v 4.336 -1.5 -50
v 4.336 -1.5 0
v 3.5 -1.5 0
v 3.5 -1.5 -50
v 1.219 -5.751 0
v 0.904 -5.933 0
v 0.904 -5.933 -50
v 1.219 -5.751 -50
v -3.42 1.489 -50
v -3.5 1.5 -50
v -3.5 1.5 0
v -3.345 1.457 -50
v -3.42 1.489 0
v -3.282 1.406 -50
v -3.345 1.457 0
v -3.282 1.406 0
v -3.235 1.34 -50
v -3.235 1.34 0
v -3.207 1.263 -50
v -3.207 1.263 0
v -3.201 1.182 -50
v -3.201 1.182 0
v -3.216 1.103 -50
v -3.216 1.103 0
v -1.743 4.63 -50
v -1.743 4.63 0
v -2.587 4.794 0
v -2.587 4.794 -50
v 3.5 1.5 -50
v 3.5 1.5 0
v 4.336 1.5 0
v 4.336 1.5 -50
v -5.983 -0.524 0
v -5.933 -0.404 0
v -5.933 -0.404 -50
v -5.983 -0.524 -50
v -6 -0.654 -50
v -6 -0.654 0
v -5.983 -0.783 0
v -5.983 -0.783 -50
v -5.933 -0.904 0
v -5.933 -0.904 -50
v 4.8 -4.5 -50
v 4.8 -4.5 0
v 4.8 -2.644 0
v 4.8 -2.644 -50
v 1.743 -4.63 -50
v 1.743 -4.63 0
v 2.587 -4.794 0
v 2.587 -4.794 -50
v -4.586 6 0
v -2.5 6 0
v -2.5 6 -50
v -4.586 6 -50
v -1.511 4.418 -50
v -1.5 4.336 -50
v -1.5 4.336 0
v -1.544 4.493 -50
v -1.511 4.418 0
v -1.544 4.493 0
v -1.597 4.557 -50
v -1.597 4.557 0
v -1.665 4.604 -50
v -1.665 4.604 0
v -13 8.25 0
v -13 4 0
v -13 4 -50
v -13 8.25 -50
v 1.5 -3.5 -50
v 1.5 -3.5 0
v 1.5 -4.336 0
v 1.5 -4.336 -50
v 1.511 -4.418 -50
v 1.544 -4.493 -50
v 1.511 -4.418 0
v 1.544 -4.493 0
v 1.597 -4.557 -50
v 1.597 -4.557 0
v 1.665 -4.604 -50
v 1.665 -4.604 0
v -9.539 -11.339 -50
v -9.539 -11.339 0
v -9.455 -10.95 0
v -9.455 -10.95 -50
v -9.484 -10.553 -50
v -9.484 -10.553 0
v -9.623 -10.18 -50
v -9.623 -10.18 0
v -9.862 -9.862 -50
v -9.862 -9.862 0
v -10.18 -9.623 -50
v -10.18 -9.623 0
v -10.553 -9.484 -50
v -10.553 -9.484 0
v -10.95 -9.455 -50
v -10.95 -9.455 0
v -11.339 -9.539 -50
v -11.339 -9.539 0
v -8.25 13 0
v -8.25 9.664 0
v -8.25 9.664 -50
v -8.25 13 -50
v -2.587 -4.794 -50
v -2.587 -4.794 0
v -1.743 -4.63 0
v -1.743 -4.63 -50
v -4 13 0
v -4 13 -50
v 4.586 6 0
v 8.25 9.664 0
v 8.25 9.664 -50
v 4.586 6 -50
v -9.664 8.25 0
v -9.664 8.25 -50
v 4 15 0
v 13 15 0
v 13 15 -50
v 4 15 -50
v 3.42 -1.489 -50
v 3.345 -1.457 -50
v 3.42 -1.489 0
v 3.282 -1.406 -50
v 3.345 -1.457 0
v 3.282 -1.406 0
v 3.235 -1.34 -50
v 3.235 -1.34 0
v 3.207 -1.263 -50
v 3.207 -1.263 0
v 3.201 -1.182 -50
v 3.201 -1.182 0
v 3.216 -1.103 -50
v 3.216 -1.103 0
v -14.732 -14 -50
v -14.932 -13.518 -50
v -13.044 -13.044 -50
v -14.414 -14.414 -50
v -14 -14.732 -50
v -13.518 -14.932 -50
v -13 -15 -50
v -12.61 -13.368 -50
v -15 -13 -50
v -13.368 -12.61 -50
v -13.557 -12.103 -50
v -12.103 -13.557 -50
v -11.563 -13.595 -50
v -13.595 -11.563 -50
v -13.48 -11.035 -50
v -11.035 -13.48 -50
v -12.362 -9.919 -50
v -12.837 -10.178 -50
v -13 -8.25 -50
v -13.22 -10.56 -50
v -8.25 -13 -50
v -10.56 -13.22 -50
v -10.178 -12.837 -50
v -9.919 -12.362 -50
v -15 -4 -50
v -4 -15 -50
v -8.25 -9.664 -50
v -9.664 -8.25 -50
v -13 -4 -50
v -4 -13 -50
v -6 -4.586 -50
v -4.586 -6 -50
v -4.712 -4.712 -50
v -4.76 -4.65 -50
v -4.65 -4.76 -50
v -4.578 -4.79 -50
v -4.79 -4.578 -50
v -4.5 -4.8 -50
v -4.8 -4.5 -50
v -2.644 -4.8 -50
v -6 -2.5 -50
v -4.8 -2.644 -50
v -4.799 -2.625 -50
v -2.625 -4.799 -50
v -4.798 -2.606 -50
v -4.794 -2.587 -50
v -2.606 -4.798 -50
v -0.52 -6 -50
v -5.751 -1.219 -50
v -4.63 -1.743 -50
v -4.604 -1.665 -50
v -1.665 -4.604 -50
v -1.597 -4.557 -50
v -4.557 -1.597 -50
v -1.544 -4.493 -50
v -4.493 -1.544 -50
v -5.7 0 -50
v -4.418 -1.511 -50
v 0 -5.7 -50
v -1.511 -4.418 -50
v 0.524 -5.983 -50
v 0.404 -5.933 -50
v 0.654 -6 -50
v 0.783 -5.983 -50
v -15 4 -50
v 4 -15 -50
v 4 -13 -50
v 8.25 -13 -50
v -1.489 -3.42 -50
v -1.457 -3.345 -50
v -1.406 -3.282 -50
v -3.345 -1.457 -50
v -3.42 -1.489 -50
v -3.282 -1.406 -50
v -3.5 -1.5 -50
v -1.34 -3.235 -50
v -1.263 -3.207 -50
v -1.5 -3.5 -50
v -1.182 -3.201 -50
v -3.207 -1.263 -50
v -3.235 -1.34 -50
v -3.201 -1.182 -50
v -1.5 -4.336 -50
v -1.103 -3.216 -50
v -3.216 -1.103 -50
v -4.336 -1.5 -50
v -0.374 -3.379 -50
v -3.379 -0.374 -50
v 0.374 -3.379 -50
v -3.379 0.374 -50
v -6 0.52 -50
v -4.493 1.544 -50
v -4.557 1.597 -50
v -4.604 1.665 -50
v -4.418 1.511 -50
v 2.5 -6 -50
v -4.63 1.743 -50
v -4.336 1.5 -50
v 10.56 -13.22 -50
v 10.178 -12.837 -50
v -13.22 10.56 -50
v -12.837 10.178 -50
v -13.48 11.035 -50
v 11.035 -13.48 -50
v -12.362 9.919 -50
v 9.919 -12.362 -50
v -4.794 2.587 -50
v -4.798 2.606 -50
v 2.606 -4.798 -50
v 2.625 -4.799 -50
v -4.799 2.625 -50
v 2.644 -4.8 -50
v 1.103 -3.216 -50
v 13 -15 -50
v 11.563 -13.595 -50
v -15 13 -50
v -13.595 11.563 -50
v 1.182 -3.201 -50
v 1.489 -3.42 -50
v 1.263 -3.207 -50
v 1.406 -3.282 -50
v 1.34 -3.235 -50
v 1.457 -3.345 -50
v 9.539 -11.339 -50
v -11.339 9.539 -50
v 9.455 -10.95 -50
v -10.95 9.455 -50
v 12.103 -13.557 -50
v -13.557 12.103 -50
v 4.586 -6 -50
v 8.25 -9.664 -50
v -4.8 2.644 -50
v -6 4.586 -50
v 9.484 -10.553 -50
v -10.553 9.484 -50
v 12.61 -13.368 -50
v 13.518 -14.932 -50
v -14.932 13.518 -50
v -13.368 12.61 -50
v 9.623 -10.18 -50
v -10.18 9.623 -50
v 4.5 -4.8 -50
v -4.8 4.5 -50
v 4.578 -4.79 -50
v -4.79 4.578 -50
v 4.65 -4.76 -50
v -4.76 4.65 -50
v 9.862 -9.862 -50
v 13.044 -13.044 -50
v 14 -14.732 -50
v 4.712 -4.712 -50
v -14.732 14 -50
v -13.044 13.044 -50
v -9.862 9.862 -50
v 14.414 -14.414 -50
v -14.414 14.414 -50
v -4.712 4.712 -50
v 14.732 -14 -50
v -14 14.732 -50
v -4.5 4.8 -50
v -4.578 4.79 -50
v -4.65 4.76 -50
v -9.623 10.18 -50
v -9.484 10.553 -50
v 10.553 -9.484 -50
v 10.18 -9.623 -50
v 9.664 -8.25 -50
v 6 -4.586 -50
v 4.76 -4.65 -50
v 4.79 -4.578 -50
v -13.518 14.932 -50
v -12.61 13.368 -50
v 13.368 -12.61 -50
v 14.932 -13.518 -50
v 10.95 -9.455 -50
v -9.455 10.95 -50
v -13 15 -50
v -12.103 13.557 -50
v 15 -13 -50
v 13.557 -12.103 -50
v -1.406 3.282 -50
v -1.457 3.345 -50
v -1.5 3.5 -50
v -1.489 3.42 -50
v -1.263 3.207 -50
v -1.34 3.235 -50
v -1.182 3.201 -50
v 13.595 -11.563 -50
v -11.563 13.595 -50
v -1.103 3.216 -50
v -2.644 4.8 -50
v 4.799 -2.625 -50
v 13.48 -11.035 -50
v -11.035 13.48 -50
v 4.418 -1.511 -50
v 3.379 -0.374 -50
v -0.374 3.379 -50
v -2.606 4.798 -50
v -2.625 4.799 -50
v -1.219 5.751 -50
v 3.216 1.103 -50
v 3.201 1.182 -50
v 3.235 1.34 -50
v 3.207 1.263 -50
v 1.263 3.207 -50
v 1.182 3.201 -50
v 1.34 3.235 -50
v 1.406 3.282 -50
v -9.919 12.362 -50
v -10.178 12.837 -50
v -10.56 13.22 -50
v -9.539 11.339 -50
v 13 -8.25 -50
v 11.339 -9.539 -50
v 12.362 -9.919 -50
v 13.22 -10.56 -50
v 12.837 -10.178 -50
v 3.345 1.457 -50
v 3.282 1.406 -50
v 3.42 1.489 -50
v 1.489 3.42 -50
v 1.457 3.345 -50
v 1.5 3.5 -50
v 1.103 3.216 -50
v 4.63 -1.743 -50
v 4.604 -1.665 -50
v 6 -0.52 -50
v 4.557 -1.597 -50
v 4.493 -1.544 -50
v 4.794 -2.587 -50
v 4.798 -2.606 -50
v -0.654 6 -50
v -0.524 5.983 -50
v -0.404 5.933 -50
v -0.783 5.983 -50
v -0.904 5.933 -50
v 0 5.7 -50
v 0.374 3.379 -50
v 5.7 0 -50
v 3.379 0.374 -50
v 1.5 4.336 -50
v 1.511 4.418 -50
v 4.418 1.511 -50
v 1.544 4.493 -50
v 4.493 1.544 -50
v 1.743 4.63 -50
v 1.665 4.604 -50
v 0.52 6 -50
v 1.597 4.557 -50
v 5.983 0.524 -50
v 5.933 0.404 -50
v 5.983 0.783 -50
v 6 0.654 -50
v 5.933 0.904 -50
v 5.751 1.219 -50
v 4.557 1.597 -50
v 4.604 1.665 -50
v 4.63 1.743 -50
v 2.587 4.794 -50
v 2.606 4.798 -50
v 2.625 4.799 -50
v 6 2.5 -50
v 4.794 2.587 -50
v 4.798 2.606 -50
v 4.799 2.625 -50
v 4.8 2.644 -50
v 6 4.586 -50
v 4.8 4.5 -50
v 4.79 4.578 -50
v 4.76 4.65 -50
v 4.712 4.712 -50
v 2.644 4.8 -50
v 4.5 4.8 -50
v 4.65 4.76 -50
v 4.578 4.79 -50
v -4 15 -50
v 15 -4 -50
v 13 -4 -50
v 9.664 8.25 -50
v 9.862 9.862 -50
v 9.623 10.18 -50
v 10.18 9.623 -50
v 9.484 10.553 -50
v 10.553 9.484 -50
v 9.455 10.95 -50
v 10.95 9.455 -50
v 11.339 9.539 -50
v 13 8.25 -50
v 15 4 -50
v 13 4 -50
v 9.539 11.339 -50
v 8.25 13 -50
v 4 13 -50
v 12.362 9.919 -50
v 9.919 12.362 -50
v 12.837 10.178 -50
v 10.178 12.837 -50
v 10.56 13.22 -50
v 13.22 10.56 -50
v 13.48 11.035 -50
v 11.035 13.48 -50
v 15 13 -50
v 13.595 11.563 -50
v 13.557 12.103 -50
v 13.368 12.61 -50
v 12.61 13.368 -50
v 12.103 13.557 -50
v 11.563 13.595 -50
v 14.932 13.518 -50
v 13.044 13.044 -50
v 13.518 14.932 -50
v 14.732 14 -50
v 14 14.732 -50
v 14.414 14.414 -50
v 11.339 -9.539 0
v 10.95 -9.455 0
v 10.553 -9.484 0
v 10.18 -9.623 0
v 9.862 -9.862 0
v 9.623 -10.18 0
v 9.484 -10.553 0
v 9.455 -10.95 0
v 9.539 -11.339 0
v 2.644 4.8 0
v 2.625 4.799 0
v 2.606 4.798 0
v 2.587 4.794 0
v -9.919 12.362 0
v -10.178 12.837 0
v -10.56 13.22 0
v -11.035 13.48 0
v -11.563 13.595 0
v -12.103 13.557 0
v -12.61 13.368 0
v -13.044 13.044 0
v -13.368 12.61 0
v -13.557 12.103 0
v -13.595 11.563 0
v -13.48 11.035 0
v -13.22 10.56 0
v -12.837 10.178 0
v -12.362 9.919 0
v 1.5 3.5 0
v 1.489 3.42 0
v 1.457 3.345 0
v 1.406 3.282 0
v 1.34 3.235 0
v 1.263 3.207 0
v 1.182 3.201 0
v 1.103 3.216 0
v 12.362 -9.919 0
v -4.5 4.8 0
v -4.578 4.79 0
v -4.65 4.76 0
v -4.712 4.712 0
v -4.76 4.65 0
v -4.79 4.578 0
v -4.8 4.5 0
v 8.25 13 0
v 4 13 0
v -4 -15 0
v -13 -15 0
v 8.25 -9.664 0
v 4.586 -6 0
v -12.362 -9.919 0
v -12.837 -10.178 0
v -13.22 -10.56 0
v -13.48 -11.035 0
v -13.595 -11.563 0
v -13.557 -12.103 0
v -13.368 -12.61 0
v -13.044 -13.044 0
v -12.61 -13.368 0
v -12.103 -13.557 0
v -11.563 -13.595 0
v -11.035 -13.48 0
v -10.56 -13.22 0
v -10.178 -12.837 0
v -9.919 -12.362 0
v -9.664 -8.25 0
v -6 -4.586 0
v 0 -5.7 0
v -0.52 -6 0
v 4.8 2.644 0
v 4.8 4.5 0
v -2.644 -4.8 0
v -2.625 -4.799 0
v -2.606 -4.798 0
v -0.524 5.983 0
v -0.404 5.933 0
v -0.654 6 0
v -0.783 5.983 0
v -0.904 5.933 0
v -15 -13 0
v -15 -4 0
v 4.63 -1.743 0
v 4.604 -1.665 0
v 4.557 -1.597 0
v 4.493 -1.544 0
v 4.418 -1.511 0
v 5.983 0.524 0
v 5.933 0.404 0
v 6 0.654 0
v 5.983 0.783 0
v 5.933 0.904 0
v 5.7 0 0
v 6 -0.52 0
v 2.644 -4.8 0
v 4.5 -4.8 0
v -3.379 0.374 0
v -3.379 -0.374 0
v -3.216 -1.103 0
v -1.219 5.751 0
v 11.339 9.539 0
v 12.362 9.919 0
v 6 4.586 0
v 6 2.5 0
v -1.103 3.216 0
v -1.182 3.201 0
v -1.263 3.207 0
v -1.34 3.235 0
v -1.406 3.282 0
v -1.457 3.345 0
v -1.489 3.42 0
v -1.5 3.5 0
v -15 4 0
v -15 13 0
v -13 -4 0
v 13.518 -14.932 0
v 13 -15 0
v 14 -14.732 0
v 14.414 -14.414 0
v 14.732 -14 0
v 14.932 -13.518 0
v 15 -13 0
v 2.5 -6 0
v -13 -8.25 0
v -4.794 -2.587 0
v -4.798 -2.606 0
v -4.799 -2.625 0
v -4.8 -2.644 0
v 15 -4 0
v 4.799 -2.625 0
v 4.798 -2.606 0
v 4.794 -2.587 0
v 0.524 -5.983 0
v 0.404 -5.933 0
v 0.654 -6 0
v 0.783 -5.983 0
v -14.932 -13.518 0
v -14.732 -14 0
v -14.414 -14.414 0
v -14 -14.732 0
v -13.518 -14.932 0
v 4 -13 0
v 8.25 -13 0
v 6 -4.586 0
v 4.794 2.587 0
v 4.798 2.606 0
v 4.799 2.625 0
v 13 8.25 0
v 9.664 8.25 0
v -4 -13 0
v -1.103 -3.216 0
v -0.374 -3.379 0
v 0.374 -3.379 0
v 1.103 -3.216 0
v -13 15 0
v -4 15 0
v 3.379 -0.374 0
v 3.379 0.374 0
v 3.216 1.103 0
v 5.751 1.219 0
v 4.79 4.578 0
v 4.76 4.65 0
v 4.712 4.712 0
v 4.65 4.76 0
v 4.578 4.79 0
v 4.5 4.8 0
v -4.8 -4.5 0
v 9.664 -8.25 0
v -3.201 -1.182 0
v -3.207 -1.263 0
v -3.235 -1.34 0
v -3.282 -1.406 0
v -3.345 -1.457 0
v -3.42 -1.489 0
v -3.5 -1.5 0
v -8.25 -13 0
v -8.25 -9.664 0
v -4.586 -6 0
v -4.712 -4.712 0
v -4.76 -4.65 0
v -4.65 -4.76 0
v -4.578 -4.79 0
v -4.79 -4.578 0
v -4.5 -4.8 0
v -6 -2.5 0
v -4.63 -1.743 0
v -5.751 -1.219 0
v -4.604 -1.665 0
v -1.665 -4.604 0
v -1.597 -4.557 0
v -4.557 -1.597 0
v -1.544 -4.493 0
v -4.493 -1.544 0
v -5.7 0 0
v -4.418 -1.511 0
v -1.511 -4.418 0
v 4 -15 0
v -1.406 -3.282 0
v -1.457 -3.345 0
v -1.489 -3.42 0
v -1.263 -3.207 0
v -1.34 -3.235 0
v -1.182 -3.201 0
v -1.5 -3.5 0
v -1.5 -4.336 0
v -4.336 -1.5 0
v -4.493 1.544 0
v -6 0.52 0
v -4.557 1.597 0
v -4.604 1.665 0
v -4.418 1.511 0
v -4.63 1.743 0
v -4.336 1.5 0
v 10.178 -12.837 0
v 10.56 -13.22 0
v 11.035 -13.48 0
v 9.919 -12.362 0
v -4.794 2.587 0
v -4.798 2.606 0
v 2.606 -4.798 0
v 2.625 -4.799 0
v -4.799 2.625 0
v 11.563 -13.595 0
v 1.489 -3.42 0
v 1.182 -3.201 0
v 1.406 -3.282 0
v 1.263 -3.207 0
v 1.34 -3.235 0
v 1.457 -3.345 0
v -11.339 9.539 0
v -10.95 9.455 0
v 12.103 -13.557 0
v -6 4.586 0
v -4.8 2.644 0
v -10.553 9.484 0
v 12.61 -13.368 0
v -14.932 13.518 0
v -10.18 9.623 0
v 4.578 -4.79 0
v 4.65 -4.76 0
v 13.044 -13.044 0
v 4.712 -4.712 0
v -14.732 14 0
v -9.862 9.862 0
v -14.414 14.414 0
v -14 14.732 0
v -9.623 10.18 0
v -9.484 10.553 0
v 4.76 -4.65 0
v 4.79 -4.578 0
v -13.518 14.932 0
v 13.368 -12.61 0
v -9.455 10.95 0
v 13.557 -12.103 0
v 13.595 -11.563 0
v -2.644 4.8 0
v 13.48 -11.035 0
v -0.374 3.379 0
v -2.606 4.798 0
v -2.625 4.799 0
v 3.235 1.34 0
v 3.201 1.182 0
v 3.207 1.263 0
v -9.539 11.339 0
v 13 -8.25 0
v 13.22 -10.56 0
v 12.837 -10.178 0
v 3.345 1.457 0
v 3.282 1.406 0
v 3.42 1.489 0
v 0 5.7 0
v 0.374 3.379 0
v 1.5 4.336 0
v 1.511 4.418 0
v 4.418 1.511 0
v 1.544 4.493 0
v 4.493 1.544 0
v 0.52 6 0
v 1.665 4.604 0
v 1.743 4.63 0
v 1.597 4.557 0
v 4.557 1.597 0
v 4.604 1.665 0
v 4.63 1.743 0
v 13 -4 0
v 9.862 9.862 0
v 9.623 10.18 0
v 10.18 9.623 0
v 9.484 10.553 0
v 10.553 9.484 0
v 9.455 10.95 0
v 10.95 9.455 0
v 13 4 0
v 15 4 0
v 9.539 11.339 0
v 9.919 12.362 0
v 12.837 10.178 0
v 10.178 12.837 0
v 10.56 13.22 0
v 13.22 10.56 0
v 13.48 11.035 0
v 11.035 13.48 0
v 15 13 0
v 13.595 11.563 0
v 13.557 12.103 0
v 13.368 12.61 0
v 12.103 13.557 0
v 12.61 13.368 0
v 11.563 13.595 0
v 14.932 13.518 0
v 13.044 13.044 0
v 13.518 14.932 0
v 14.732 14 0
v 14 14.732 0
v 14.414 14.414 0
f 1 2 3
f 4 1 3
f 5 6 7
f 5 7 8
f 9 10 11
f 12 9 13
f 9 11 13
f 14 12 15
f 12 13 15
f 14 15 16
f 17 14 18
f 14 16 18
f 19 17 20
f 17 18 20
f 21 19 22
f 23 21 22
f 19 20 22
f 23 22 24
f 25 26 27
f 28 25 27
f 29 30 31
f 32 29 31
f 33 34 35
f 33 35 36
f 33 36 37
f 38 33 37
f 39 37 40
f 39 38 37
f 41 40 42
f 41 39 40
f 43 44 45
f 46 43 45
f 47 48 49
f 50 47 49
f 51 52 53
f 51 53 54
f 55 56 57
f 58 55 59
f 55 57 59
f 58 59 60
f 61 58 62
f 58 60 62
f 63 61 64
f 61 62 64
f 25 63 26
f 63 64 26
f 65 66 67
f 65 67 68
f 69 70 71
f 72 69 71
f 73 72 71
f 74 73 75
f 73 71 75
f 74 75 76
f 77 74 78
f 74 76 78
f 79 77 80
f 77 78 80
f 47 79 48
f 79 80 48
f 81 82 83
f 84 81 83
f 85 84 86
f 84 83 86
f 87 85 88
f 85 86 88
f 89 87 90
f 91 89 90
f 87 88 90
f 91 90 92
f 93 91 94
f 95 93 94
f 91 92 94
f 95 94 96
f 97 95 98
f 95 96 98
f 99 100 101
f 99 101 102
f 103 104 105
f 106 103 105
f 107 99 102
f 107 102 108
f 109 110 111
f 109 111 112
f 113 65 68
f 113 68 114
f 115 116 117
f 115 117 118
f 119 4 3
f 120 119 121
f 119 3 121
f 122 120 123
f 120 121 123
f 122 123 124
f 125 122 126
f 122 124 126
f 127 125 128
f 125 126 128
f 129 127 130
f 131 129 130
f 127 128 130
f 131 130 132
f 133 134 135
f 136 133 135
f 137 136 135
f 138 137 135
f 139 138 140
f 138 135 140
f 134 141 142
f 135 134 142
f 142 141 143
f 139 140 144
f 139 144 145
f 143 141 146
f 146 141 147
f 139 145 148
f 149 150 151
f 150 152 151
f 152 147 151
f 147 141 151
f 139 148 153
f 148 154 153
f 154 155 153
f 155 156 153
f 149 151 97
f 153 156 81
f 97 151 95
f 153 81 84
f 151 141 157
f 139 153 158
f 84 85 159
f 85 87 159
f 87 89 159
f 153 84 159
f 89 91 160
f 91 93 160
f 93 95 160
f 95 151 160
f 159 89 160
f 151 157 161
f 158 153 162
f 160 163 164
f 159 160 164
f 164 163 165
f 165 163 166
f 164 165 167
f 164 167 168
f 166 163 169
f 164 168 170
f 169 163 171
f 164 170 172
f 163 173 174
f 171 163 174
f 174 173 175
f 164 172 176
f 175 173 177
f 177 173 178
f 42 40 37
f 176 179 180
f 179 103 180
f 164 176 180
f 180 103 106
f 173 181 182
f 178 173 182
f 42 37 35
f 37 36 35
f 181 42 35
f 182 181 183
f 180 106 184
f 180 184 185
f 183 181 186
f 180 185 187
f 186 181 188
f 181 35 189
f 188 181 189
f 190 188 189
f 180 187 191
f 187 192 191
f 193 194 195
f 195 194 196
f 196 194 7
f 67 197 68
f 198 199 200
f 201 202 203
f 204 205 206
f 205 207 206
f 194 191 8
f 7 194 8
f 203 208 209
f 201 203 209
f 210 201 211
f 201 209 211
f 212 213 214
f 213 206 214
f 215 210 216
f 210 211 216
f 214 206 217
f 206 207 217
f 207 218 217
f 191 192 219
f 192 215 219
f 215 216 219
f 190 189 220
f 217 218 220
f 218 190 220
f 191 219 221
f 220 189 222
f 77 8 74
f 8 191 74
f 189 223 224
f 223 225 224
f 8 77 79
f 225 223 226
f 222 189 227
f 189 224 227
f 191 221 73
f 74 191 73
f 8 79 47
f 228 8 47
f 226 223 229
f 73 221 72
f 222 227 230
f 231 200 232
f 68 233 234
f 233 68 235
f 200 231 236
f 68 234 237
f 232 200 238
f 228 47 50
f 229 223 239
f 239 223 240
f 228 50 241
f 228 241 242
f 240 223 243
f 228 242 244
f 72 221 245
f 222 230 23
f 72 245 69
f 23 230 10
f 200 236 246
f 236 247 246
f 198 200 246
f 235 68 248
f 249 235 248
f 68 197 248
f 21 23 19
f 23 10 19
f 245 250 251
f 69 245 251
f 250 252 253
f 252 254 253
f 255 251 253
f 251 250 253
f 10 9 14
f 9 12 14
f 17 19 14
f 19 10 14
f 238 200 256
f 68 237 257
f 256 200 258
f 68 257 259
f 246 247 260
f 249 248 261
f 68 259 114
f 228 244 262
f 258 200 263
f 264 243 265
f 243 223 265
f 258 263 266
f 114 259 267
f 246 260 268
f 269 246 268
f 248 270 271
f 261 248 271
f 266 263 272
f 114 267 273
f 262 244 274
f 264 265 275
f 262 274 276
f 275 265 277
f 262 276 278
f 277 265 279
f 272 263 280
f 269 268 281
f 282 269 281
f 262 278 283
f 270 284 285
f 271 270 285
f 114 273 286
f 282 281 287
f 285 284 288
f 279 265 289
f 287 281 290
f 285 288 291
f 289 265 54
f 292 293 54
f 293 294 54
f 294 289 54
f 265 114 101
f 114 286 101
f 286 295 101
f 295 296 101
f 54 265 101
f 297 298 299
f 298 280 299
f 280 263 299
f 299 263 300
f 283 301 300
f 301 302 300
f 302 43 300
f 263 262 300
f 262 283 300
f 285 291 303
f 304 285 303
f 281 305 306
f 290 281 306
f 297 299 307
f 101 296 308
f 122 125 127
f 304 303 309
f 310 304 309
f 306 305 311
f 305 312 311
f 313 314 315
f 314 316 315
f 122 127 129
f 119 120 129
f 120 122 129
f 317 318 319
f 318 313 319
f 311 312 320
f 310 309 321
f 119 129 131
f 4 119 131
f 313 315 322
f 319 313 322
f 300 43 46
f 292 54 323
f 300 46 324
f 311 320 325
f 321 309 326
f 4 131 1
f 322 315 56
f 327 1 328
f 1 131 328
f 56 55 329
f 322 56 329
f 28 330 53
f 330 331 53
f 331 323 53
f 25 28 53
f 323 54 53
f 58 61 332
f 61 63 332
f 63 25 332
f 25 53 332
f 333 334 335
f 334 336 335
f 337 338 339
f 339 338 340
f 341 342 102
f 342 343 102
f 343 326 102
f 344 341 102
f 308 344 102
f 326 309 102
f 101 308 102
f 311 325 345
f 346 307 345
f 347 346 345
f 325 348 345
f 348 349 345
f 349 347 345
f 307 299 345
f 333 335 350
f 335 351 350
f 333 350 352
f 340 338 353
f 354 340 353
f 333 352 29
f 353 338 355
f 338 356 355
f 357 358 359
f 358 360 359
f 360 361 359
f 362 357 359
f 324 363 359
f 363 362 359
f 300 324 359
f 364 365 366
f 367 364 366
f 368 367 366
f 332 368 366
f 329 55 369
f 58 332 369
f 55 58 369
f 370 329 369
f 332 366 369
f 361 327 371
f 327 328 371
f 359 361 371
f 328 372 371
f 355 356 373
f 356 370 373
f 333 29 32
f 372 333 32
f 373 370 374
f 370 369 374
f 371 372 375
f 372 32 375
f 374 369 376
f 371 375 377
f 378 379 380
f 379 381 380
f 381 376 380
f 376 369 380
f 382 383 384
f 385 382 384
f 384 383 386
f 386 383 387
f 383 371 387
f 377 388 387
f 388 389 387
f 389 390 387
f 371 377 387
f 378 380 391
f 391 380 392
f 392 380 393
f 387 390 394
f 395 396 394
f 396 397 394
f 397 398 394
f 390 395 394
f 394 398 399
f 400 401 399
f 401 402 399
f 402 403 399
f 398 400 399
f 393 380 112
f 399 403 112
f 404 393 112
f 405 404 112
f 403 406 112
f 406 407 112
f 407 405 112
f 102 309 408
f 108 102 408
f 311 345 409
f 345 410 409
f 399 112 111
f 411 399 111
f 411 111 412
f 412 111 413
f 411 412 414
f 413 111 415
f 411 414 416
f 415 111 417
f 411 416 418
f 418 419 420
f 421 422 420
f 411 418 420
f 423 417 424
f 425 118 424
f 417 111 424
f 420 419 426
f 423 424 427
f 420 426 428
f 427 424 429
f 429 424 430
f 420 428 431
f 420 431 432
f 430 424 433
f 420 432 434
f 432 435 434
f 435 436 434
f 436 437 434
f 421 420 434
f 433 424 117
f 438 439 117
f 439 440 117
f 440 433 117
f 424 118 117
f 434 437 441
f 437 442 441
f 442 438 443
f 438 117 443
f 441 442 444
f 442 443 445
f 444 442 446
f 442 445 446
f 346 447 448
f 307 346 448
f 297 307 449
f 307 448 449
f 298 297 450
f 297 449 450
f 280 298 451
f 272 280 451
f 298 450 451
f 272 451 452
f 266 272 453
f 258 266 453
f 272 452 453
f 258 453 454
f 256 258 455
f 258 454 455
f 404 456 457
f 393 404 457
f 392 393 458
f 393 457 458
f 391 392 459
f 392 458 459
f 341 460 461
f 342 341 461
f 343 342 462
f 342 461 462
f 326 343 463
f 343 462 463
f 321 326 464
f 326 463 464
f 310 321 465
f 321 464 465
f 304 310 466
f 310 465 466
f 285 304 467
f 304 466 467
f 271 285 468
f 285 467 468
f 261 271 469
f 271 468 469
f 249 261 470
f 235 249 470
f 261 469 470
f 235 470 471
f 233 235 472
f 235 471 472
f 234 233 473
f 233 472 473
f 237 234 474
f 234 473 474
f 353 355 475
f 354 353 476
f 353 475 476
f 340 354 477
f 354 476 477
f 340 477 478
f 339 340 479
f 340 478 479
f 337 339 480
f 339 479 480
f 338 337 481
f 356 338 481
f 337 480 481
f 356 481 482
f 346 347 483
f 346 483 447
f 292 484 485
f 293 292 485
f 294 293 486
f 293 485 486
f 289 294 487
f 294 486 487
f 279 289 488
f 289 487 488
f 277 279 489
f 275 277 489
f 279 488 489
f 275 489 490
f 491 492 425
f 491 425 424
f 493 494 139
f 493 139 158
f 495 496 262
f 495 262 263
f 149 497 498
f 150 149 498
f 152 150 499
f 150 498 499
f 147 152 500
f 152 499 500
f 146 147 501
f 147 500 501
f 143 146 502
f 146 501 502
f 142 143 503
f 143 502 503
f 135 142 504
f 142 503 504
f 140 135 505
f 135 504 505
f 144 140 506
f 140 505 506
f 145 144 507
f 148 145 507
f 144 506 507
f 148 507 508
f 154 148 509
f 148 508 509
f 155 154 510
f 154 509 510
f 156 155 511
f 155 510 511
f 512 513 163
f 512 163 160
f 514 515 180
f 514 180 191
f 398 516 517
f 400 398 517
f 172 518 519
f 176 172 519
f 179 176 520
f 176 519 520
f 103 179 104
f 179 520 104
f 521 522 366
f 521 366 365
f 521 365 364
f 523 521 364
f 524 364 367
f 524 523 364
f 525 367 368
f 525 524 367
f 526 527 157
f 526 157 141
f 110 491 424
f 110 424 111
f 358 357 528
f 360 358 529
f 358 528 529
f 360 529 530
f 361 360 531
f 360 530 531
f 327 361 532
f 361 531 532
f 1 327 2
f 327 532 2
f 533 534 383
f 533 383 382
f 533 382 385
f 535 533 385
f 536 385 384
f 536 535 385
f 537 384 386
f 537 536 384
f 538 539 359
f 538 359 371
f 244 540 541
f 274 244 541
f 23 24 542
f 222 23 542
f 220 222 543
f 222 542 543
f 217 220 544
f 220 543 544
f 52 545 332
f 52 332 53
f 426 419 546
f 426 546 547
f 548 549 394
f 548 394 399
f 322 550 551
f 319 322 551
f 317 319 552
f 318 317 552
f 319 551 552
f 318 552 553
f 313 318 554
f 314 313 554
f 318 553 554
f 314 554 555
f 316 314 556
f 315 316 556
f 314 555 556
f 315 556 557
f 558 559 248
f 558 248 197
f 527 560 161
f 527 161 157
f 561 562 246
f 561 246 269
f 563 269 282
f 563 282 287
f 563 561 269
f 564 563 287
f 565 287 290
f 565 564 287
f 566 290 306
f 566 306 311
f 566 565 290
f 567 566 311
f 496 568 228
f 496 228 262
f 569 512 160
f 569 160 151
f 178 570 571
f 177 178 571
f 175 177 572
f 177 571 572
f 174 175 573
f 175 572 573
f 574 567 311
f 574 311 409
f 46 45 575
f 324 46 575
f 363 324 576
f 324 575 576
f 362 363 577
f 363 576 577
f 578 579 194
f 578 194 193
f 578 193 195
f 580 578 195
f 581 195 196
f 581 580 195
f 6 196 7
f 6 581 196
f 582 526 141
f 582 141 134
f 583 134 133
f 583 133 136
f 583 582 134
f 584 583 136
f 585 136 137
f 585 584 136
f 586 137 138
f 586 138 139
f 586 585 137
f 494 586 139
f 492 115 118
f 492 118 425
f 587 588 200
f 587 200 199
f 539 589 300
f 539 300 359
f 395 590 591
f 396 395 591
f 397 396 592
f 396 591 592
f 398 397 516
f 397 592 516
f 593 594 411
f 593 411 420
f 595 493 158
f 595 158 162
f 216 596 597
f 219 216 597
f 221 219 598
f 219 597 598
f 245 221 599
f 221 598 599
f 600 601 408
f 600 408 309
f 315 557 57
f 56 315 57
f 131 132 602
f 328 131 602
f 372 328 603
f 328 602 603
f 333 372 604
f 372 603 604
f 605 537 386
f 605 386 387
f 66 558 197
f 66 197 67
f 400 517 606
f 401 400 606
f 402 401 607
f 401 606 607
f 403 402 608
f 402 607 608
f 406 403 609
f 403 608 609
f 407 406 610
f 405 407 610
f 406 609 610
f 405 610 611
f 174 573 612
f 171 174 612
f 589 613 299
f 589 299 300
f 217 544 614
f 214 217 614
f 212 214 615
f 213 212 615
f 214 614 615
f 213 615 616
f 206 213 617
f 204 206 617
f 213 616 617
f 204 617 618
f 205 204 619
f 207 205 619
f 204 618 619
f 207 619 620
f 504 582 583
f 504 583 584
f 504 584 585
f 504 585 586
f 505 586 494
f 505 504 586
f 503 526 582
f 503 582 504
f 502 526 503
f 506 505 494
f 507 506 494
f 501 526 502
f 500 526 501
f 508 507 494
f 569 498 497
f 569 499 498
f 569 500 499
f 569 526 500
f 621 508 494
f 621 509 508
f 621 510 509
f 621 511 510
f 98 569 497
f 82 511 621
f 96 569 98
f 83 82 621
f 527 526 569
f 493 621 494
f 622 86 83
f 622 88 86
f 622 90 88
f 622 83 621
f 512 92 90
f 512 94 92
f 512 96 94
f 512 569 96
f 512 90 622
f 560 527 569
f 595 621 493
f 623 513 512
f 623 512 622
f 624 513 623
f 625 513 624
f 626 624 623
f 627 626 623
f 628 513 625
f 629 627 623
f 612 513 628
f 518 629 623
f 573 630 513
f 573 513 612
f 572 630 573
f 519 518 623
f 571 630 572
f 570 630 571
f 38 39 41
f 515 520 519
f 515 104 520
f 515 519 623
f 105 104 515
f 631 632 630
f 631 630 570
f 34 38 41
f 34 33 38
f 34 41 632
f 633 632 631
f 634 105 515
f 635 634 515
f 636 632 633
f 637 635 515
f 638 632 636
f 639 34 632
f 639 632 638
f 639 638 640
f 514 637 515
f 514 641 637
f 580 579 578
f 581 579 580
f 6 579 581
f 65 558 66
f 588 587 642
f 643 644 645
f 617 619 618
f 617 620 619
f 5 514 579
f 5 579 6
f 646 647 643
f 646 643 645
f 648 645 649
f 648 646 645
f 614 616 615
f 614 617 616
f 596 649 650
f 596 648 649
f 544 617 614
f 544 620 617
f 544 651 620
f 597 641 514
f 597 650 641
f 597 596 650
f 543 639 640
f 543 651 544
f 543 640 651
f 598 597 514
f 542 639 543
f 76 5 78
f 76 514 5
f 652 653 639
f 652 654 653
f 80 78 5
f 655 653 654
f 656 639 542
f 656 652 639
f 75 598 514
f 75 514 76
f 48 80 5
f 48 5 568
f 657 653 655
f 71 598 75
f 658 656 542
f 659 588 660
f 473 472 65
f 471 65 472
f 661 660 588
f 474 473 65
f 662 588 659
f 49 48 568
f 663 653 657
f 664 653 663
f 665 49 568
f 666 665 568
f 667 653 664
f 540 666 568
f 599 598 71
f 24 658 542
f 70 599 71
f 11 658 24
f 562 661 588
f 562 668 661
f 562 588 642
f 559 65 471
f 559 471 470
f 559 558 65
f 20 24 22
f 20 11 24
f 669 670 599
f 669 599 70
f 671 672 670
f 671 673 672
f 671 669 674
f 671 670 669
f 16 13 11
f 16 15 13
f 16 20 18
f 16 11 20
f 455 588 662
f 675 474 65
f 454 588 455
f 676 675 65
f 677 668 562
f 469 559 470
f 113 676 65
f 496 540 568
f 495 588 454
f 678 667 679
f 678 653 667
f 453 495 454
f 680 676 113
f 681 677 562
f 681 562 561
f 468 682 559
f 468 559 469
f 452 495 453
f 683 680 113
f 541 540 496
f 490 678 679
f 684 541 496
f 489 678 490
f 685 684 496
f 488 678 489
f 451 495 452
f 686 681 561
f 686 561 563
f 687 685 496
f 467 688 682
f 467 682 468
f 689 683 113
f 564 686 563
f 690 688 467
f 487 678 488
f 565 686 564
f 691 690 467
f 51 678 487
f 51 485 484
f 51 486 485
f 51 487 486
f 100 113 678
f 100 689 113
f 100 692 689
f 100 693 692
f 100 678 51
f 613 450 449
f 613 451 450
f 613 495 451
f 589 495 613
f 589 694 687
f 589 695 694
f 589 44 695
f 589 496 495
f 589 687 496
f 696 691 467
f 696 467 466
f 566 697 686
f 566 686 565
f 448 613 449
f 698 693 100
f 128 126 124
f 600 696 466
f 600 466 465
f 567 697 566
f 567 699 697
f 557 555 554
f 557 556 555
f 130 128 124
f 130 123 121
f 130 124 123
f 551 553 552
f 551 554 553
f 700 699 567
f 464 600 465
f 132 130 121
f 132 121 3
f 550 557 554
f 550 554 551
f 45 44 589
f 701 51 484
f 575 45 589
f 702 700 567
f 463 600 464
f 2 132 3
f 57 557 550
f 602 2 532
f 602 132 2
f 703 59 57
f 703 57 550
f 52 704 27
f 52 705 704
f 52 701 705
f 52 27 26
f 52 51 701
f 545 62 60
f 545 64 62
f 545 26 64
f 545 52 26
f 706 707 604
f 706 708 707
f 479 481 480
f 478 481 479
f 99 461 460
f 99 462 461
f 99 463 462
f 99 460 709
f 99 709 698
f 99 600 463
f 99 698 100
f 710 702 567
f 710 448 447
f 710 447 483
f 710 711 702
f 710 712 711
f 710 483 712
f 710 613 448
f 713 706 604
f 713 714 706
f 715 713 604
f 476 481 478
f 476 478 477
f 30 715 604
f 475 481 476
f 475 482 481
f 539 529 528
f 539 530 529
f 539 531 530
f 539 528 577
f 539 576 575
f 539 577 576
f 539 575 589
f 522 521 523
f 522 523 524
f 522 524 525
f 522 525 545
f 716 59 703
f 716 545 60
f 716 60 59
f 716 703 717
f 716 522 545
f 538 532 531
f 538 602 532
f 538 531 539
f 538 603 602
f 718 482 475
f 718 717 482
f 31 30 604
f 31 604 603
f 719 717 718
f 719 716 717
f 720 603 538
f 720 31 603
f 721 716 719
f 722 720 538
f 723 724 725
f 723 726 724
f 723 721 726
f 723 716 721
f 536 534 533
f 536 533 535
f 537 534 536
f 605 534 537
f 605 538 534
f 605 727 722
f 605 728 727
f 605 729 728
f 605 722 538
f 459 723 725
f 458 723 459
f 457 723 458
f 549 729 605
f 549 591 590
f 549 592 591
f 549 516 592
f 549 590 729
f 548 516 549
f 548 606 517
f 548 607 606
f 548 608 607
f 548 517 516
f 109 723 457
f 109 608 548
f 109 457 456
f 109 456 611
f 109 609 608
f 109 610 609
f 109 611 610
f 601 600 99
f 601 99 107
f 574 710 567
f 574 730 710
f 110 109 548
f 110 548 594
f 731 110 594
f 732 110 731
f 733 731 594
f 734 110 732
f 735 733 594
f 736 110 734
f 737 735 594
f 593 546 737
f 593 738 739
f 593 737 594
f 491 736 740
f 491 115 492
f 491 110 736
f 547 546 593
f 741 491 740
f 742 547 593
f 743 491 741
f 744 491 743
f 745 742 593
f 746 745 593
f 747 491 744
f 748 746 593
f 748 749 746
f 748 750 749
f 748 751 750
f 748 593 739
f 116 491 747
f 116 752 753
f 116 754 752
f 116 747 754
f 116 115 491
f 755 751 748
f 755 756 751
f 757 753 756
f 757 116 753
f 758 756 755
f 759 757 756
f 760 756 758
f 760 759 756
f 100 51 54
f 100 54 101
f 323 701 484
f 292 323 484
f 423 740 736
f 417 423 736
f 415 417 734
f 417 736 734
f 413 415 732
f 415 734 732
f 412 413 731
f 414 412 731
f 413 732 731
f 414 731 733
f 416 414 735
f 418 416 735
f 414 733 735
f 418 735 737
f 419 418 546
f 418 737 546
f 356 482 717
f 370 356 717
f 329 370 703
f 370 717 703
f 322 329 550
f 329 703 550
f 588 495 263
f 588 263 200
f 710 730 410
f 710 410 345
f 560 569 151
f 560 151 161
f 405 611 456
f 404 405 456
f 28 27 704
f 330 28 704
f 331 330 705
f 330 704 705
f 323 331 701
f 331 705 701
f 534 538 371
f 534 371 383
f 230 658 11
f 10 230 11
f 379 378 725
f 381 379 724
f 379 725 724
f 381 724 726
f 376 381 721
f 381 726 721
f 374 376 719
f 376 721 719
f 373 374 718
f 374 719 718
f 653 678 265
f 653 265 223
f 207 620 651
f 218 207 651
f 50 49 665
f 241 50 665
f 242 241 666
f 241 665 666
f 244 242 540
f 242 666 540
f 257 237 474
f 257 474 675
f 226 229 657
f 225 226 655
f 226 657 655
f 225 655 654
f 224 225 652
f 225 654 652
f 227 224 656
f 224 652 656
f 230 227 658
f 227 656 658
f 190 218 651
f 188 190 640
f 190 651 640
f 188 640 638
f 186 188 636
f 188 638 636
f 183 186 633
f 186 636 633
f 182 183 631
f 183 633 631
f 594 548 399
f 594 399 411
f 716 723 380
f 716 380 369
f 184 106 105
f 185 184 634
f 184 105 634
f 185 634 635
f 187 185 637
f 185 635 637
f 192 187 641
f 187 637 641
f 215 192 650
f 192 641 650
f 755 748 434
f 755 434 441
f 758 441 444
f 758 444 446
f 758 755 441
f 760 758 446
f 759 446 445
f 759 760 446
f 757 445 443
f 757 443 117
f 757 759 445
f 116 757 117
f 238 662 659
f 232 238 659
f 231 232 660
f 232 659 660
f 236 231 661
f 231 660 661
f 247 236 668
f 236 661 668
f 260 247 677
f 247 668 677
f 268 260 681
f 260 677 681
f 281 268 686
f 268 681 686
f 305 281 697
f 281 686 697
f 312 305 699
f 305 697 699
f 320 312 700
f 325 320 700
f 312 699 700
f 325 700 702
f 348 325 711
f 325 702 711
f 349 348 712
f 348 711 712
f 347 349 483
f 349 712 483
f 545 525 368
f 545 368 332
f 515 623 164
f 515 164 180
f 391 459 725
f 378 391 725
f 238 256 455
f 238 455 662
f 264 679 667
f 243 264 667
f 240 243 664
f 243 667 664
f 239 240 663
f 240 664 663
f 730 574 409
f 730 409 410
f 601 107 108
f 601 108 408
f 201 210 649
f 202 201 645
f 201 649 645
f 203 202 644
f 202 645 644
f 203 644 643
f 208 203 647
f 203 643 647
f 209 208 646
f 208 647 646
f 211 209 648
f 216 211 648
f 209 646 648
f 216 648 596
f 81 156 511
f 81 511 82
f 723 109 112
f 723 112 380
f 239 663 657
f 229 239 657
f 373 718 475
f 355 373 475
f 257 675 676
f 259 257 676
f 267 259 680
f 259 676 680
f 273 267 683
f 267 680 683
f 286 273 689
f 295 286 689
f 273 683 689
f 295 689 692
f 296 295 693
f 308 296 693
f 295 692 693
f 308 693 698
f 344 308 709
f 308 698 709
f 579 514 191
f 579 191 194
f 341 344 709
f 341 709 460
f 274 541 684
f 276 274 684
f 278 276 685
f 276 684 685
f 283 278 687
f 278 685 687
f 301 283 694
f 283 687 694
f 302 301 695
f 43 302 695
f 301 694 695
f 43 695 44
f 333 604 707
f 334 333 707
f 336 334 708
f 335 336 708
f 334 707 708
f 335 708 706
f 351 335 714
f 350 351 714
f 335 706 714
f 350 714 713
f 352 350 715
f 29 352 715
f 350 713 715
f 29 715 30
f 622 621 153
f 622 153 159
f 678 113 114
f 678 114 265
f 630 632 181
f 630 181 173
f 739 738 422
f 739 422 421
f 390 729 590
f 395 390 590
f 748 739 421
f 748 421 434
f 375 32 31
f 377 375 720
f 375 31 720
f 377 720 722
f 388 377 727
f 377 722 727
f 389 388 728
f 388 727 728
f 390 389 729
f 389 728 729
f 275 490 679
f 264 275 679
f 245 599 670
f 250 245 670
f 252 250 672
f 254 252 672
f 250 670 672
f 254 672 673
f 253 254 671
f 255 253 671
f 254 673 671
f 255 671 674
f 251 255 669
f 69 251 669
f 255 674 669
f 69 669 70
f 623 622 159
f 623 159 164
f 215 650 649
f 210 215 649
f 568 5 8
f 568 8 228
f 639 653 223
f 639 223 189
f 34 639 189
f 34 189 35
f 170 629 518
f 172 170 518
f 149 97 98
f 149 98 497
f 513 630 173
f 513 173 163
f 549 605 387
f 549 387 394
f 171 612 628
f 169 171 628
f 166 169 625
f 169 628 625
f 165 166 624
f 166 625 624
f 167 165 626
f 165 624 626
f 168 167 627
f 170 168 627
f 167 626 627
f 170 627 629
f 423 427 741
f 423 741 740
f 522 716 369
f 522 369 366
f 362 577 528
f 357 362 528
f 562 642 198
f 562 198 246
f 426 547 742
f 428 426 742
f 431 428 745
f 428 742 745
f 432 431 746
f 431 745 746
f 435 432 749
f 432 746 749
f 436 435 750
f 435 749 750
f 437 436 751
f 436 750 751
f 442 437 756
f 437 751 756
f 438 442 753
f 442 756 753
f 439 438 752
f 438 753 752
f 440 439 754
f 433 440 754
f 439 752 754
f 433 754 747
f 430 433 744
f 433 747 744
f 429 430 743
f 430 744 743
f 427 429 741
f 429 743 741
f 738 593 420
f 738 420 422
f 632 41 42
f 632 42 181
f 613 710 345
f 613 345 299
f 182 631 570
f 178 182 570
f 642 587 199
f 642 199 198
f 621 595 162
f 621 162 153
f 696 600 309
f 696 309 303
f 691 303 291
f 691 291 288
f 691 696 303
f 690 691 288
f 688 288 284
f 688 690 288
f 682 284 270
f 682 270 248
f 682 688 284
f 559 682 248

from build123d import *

# Parameters (mm, degrees)
BOSS_EXTRUDE1_DEPTH = 50
CUT_EXTRUDE1_DEPTH  = 50


with BuildPart() as part:
    # Sketch1 → Boss-Extrude1 (new body)
    with BuildSketch(Plane.XY):
        with BuildLine():
            Line((-15, 4), (-13, 4))
            Line((-13, 4), (-13, 8.25))
            Line((-13, 8.25), (-9.664213562, 8.25))
            Line((-9.664213562, 8.25), (-6, 4.585786438))
            Line((-6, 4.585786438), (-6, 0.519615242))
            Line((-6, 0.519615242), (-5.7, 0))
            Line((-5.7, 0), (-5.933012702, -0.403589838))
            ThreePointArc((-5.933012702, -0.403589838), (-6, -0.653589838), (-5.933012702, -0.903589838))
            Line((-5.933012702, -0.903589838), (-5.750976592, -1.218885629))
            Line((-5.750976592, -1.218885629), (-6, -2.5))
            Line((-6, -2.5), (-6, -4.585786438))
            Line((-6, -4.585786438), (-9.664213562, -8.25))
            Line((-9.664213562, -8.25), (-13, -8.25))
            Line((-13, -8.25), (-13, -4))
            Line((-13, -4), (-15, -4))
            Line((-15, -4), (-15, -13))
            ThreePointArc((-15, -13), (-14.414213562, -14.414213562), (-13, -15))
            Line((-13, -15), (-4, -15))
            Line((-4, -15), (-4, -13))
            Line((-4, -13), (-8.25, -13))
            Line((-8.25, -13), (-8.25, -9.664213562))
            Line((-8.25, -9.664213562), (-4.585786438, -6))
            Line((-4.585786438, -6), (-0.519615242, -6))
            Line((-0.519615242, -6), (0, -5.7))
            Line((0, -5.7), (0.403589838, -5.933012702))
            ThreePointArc((0.403589838, -5.933012702), (0.653589838, -6), (0.903589838, -5.933012702))
            Line((0.903589838, -5.933012702), (1.218885629, -5.750976592))
            Line((1.218885629, -5.750976592), (2.5, -6))
            Line((2.5, -6), (4.585786438, -6))
            Line((4.585786438, -6), (8.25, -9.664213562))
            Line((8.25, -9.664213562), (8.25, -13))
            Line((8.25, -13), (4, -13))
            Line((4, -13), (4, -15))
            Line((4, -15), (13, -15))
            ThreePointArc((13, -15), (14.414213562, -14.414213562), (15, -13))
            Line((15, -13), (15, -4))
            Line((15, -4), (13, -4))
            Line((13, -4), (13, -8.25))
            Line((13, -8.25), (9.664213562, -8.25))
            Line((9.664213562, -8.25), (6, -4.585786438))
            Line((6, -4.585786438), (6, -0.519615242))
            Line((6, -0.519615242), (5.7, 0))
            Line((5.7, 0), (5.933012702, 0.403589838))
            ThreePointArc((5.933012702, 0.403589838), (6, 0.653589838), (5.933012702, 0.903589838))
            Line((5.933012702, 0.903589838), (5.750976592, 1.218885629))
            Line((5.750976592, 1.218885629), (6, 2.5))
            Line((6, 2.5), (6, 4.585786438))
            Line((6, 4.585786438), (9.664213562, 8.25))
            Line((9.664213562, 8.25), (13, 8.25))
            Line((13, 8.25), (13, 4))
            Line((13, 4), (15, 4))
            Line((15, 4), (15, 13))
            ThreePointArc((15, 13), (14.414213562, 14.414213562), (13, 15))
            Line((13, 15), (4, 15))
            Line((4, 15), (4, 13))
            Line((4, 13), (8.25, 13))
            Line((8.25, 13), (8.25, 9.664213562))
            Line((8.25, 9.664213562), (4.585786438, 6))
            Line((4.585786438, 6), (0.519615242, 6))
            Line((0.519615242, 6), (0, 5.7))
            Line((0, 5.7), (-0.403589838, 5.933012702))
            ThreePointArc((-0.403589838, 5.933012702), (-0.653589838, 6), (-0.903589838, 5.933012702))
            Line((-0.903589838, 5.933012702), (-1.218885629, 5.750976592))
            Line((-1.218885629, 5.750976592), (-2.5, 6))
            Line((-2.5, 6), (-4.585786438, 6))
            Line((-4.585786438, 6), (-8.25, 9.664213562))
            Line((-8.25, 9.664213562), (-8.25, 13))
            Line((-8.25, 13), (-4, 13))
            Line((-4, 13), (-4, 15))
            Line((-4, 15), (-13, 15))
            ThreePointArc((-13, 15), (-14.414213562, 14.414213562), (-15, 13))
            Line((-15, 13), (-15, 4))
        make_face()
        with BuildLine():
            Line((11.338915743, 9.539070071), (12.361530981, 9.918883282))
            ThreePointArc((12.361530981, 9.918883282), (13.043502884, 13.043502884), (9.918883282, 12.361530981))
            Line((9.918883282, 12.361530981), (9.539070071, 11.338915743))
            ThreePointArc((9.539070071, 11.338915743), (9.861522369, 9.861522369), (11.338915743, 9.539070071))
        make_face(mode=Mode.SUBTRACT)
        with BuildLine():
            Line((9.539070071, -11.338915743), (9.918883282, -12.361530981))
            ThreePointArc((9.918883282, -12.361530981), (13.043502884, -13.043502884), (12.361530981, -9.918883282))
            Line((12.361530981, -9.918883282), (11.338915743, -9.539070071))
            ThreePointArc((11.338915743, -9.539070071), (9.861522369, -9.861522369), (9.539070071, -11.338915743))
        make_face(mode=Mode.SUBTRACT)
        with BuildLine():
            Line((-12.361530981, 9.918883282), (-11.338915743, 9.539070071))
            ThreePointArc((-11.338915743, 9.539070071), (-9.861522369, 9.861522369), (-9.539070071, 11.338915743))
            Line((-9.539070071, 11.338915743), (-9.918883282, 12.361530981))
            ThreePointArc((-9.918883282, 12.361530981), (-13.043502884, 13.043502884), (-12.361530981, 9.918883282))
        make_face(mode=Mode.SUBTRACT)
        with BuildLine():
            Line((-9.918883282, -12.361530981), (-9.539070071, -11.338915743))
            ThreePointArc((-9.539070071, -11.338915743), (-9.861522369, -9.861522369), (-11.338915743, -9.539070071))
            Line((-11.338915743, -9.539070071), (-12.361530981, -9.918883282))
            ThreePointArc((-12.361530981, -9.918883282), (-13.043502884, -13.043502884), (-9.918883282, -12.361530981))
        make_face(mode=Mode.SUBTRACT)
    extrude(amount=-BOSS_EXTRUDE1_DEPTH)

    # Sketch2 → Cut-Extrude1 (cut)
    with BuildSketch(Plane.XY):
        with BuildLine():
            Line((-4.5, -4.8), (-2.644433572, -4.8))
            ThreePointArc((-2.644433572, -4.8), (-2.615679847, -4.79861886), (-2.587190874, -4.794488155))
            Line((-2.587190874, -4.794488155), (-1.742757301, -4.630346896))
            ThreePointArc((-1.742757301, -4.630346896), (-1.568512625, -4.526682207), (-1.5, -4.335858741))
            Line((-1.5, -4.335858741), (-1.5, -3.5))
            ThreePointArc((-1.5, -3.5), (-1.374371466, -3.255879964), (-1.10270272, -3.21621621))
            ThreePointArc((-1.10270272, -3.21621621), (-9e-09, -3.4), (1.102702703, -3.216216216))
            ThreePointArc((1.102702703, -3.216216216), (1.374371458, -3.255879959), (1.5, -3.5))
            Line((1.5, -3.5), (1.5, -4.335858741))
            ThreePointArc((1.5, -4.335858741), (1.568512625, -4.526682207), (1.742757301, -4.630346896))
            Line((1.742757301, -4.630346896), (2.587190874, -4.794488155))
            ThreePointArc((2.587190874, -4.794488155), (2.615679847, -4.79861886), (2.644433572, -4.8))
            Line((2.644433572, -4.8), (4.5, -4.8))
            ThreePointArc((4.5, -4.8), (4.712132034, -4.712132034), (4.8, -4.5))
            Line((4.8, -4.5), (4.8, -2.644433572))
            ThreePointArc((4.8, -2.644433572), (4.79861886, -2.615679847), (4.794488155, -2.587190874))
            Line((4.794488155, -2.587190874), (4.630346896, -1.742757301))
            ThreePointArc((4.630346896, -1.742757301), (4.526682207, -1.568512625), (4.335858741, -1.5))
            Line((4.335858741, -1.5), (3.5, -1.5))
            ThreePointArc((3.5, -1.5), (3.255879964, -1.374371466), (3.21621621, -1.10270272))
            ThreePointArc((3.21621621, -1.10270272), (3.4, -9e-09), (3.216216216, 1.102702703))
            ThreePointArc((3.216216216, 1.102702703), (3.255879959, 1.374371458), (3.5, 1.5))
            Line((3.5, 1.5), (4.335858741, 1.5))
            ThreePointArc((4.335858741, 1.5), (4.526682207, 1.568512625), (4.630346896, 1.742757301))
            Line((4.630346896, 1.742757301), (4.794488155, 2.587190874))
            ThreePointArc((4.794488155, 2.587190874), (4.79861886, 2.615679847), (4.8, 2.644433572))
            Line((4.8, 2.644433572), (4.8, 4.5))
            ThreePointArc((4.8, 4.5), (4.712132034, 4.712132034), (4.5, 4.8))
            Line((4.5, 4.8), (2.644433572, 4.8))
            ThreePointArc((2.644433572, 4.8), (2.615679847, 4.79861886), (2.587190874, 4.794488155))
            Line((2.587190874, 4.794488155), (1.742757301, 4.630346896))
            ThreePointArc((1.742757301, 4.630346896), (1.568512625, 4.526682207), (1.5, 4.335858741))
            Line((1.5, 4.335858741), (1.5, 3.5))
            ThreePointArc((1.5, 3.5), (1.374371466, 3.255879964), (1.10270272, 3.21621621))
            ThreePointArc((1.10270272, 3.21621621), (9e-09, 3.4), (-1.102702703, 3.216216216))
            ThreePointArc((-1.102702703, 3.216216216), (-1.374371458, 3.255879959), (-1.5, 3.5))
            Line((-1.5, 3.5), (-1.5, 4.335858741))
            ThreePointArc((-1.5, 4.335858741), (-1.568512625, 4.526682207), (-1.742757301, 4.630346896))
            Line((-1.742757301, 4.630346896), (-2.587190874, 4.794488155))
            ThreePointArc((-2.587190874, 4.794488155), (-2.615679847, 4.79861886), (-2.644433572, 4.8))
            Line((-2.644433572, 4.8), (-4.5, 4.8))
            ThreePointArc((-4.5, 4.8), (-4.712132034, 4.712132034), (-4.8, 4.5))
            Line((-4.8, 4.5), (-4.8, 2.644433572))
            ThreePointArc((-4.8, 2.644433572), (-4.79861886, 2.615679847), (-4.794488155, 2.587190874))
            Line((-4.794488155, 2.587190874), (-4.630346896, 1.742757301))
            ThreePointArc((-4.630346896, 1.742757301), (-4.526682207, 1.568512625), (-4.335858741, 1.5))
            Line((-4.335858741, 1.5), (-3.5, 1.5))
            ThreePointArc((-3.5, 1.5), (-3.255879964, 1.374371466), (-3.21621621, 1.10270272))
            ThreePointArc((-3.21621621, 1.10270272), (-3.4, 9e-09), (-3.216216216, -1.102702703))
            ThreePointArc((-3.216216216, -1.102702703), (-3.255879959, -1.374371458), (-3.5, -1.5))
            Line((-3.5, -1.5), (-4.335858741, -1.5))
            ThreePointArc((-4.335858741, -1.5), (-4.526682207, -1.568512625), (-4.630346896, -1.742757301))
            Line((-4.630346896, -1.742757301), (-4.794488155, -2.587190874))
            ThreePointArc((-4.794488155, -2.587190874), (-4.79861886, -2.615679847), (-4.8, -2.644433572))
            Line((-4.8, -2.644433572), (-4.8, -4.5))
            ThreePointArc((-4.8, -4.5), (-4.712132034, -4.712132034), (-4.5, -4.8))
        make_face()
    extrude(amount=-CUT_EXTRUDE1_DEPTH, mode=Mode.SUBTRACT)


solid = part.part
